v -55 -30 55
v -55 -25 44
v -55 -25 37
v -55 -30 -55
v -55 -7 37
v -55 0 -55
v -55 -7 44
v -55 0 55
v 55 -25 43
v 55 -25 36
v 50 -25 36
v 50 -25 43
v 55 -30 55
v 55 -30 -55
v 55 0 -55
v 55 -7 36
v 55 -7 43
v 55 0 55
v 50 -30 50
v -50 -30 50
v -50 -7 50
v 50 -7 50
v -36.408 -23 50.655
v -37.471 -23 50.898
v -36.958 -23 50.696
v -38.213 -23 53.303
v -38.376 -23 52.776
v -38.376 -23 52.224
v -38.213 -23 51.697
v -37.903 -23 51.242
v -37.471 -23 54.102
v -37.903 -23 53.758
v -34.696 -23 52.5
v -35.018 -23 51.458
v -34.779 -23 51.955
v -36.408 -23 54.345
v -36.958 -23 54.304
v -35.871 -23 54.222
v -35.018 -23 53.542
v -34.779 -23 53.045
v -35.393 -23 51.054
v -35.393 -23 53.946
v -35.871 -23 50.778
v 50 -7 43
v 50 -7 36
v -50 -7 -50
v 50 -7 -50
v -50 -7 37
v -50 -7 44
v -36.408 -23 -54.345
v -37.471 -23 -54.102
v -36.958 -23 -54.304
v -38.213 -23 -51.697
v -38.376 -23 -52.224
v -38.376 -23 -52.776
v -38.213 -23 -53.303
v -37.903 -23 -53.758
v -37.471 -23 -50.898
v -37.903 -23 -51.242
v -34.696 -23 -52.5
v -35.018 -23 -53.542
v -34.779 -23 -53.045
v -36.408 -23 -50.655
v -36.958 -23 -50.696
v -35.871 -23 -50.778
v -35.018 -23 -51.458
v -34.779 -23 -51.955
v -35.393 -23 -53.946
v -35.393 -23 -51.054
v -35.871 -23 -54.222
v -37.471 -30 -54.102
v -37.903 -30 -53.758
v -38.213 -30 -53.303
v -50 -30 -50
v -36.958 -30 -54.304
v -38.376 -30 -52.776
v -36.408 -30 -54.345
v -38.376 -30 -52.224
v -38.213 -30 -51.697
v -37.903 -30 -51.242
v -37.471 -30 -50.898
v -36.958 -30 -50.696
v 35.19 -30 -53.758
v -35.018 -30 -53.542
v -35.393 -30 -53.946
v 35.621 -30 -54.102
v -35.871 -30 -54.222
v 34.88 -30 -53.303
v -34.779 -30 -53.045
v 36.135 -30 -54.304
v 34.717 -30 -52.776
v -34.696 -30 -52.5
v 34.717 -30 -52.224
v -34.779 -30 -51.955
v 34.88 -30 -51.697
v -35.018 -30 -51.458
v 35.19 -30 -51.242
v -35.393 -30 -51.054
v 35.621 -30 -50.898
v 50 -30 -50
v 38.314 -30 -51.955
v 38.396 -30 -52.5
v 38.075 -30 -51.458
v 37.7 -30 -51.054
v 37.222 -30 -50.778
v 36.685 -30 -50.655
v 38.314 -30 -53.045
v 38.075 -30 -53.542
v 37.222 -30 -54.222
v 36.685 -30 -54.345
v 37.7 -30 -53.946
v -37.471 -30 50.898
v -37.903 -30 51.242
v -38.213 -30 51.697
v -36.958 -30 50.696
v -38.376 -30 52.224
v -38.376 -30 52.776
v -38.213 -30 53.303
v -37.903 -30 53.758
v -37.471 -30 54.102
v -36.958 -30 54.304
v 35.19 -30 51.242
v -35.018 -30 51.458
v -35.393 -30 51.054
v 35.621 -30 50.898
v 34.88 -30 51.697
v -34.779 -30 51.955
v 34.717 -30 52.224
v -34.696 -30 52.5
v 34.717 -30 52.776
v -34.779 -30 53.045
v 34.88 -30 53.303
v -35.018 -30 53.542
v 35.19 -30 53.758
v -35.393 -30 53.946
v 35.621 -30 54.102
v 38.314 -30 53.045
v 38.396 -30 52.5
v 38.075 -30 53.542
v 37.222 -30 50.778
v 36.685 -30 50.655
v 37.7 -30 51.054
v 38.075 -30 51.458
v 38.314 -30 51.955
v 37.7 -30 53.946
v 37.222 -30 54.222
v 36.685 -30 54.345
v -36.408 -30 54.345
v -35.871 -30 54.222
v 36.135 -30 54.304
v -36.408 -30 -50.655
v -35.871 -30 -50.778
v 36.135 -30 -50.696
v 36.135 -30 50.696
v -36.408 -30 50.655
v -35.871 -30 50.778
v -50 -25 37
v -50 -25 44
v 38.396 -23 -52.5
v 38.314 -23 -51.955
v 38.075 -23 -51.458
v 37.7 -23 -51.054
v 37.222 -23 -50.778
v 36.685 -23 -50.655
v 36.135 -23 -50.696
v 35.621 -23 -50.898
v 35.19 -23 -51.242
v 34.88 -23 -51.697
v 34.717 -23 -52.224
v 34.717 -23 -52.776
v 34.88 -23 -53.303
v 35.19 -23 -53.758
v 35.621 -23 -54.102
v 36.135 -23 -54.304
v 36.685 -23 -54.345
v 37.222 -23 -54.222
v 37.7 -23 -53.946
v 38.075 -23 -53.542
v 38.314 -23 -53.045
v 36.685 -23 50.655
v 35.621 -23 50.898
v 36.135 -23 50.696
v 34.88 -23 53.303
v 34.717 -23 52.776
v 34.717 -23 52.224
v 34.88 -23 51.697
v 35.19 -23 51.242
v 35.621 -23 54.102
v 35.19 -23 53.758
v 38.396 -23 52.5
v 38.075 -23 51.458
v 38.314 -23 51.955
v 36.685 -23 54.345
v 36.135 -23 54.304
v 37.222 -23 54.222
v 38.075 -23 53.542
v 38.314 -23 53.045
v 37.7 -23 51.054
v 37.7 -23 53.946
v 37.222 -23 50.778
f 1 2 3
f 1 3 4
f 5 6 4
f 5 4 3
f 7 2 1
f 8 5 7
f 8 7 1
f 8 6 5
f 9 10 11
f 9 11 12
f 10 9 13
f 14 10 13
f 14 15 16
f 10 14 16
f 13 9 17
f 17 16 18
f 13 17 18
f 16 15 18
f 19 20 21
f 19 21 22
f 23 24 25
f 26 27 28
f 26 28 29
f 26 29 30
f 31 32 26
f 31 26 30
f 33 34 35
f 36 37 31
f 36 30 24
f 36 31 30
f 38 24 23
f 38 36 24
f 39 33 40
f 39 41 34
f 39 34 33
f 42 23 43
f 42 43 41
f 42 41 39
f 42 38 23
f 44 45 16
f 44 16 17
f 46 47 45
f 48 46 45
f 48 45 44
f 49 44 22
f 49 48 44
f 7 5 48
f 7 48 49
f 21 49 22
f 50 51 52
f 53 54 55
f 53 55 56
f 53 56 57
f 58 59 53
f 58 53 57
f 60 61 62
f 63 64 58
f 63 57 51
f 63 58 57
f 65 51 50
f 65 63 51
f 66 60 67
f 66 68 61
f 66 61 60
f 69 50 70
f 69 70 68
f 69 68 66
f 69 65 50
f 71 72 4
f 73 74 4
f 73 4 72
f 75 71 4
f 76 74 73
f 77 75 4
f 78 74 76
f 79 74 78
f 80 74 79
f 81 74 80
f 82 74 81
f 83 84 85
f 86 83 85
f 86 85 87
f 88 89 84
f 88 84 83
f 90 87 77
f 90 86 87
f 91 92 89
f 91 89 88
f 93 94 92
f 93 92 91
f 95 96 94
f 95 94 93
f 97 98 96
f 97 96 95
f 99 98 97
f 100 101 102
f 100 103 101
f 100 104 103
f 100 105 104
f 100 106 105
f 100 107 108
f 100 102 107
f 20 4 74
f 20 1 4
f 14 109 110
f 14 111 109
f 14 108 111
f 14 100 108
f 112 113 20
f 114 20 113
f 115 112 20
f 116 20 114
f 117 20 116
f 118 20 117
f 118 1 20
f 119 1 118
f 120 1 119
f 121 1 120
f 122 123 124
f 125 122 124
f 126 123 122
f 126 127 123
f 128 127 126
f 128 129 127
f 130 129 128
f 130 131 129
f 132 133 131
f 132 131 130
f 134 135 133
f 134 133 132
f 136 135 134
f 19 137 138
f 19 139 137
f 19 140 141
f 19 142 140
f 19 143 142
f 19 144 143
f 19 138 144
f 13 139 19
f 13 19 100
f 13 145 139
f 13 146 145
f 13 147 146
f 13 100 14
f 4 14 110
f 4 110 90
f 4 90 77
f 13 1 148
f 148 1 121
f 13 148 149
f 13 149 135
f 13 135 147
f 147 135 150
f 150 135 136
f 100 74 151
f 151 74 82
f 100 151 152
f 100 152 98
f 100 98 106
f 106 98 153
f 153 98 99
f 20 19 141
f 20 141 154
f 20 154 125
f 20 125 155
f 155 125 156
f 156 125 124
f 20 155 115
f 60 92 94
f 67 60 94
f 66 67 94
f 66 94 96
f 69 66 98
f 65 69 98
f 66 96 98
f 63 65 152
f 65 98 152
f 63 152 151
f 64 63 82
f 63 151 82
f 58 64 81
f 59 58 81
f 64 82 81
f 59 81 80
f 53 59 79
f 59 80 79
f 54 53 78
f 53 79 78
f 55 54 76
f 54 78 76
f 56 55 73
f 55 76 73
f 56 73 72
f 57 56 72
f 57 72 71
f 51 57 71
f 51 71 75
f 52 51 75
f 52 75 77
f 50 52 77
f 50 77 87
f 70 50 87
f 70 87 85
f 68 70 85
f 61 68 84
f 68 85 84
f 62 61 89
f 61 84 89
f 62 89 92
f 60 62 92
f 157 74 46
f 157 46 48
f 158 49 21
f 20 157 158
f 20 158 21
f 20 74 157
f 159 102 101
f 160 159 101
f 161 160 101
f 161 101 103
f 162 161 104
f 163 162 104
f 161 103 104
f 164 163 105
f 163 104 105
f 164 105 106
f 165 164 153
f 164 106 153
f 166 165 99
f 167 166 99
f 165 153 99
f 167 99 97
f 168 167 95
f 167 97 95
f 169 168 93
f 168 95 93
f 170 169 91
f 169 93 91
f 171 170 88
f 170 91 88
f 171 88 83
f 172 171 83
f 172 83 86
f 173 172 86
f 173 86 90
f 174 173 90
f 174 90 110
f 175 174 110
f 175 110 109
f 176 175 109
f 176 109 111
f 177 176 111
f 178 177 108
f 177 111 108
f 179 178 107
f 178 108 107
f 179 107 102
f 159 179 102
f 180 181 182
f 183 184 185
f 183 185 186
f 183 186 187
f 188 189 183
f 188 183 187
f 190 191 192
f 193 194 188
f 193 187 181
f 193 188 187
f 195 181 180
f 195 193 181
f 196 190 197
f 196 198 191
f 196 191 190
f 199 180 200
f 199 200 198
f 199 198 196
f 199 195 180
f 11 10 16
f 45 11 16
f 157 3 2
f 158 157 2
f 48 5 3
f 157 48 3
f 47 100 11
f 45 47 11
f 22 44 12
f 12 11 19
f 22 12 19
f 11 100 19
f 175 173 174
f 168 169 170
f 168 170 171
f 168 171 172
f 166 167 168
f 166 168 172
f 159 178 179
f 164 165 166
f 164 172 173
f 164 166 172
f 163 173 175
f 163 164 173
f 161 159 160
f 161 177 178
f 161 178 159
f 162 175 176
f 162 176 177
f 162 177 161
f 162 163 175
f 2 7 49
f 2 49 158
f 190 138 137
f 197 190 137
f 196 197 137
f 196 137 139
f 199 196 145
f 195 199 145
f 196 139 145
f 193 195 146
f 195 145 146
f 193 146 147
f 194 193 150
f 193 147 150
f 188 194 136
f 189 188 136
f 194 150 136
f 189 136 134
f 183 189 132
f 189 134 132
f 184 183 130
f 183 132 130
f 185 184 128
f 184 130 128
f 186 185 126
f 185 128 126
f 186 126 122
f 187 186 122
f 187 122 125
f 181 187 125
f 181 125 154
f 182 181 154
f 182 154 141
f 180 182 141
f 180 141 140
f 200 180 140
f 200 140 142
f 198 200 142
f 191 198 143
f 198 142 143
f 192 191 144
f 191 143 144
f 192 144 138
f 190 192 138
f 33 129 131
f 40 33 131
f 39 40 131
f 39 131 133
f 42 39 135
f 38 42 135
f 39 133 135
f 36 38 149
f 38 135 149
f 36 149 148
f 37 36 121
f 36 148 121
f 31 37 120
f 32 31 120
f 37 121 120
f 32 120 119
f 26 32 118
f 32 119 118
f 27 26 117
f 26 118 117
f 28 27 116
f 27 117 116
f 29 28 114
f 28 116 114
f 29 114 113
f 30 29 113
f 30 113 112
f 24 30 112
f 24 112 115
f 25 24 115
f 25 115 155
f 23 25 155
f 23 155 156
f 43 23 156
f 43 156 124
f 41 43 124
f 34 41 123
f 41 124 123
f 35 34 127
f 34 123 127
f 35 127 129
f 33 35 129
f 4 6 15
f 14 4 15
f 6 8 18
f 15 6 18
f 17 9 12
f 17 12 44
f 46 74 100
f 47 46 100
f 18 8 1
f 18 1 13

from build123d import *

# Parameters (mm, degrees)
F0_W     = 110
F0_H     = 110
F1_DEPTH = 30
F2_W     = 100
F2_H     = 100
F3_DEPTH = 23
F4_W     = 18
F4_H     = 7
F5_DEPTH = 10
F6_W     = 18
F6_H     = 7
F7_DEPTH = 10
F8_R     = 1.85
F9_DEPTH = 7


with BuildPart() as f1:
    # F0 (on Front) → F1 (new body)
    with BuildSketch(Plane.XZ):
        Rectangle(F0_W, F0_H)
    extrude(amount=F1_DEPTH)

    # F2 (on face) → F3 (cut)
    with BuildSketch(Plane.XZ.offset(30)):
        Rectangle(F2_W, F2_H)
    extrude(amount=-F3_DEPTH, mode=Mode.SUBTRACT)

    # F4 (on face) → F5 (cut)
    with BuildSketch(Plane.YZ.offset(55)):
        with Locations((-16, 39.5)):
            Rectangle(F4_W, F4_H)
    extrude(amount=-F5_DEPTH, mode=Mode.SUBTRACT)

    # F6 (on face) → F7 (cut)
    with BuildSketch(Plane(origin=(-55, 0, 0), x_dir=(0, -1, 0), z_dir=(-1, 0, 0))):
        with Locations((16, 40.5)):
            Rectangle(F6_W, F6_H)
    extrude(amount=-F7_DEPTH, mode=Mode.SUBTRACT)

    # F8 (on face) → F9 (cut)
    with BuildSketch(Plane.XZ.offset(30)):
        with Locations((-36.546465, 52.5)):
            Circle(F8_R)
        with Locations((36.546465, 52.5)):
            Circle(F8_R)
        with Locations((-36.546465, -52.5)):
            Circle(F8_R)
        with Locations((36.546465, -52.5)):
            Circle(F8_R)
    extrude(amount=-F9_DEPTH, mode=Mode.SUBTRACT)


solid = f1.part
